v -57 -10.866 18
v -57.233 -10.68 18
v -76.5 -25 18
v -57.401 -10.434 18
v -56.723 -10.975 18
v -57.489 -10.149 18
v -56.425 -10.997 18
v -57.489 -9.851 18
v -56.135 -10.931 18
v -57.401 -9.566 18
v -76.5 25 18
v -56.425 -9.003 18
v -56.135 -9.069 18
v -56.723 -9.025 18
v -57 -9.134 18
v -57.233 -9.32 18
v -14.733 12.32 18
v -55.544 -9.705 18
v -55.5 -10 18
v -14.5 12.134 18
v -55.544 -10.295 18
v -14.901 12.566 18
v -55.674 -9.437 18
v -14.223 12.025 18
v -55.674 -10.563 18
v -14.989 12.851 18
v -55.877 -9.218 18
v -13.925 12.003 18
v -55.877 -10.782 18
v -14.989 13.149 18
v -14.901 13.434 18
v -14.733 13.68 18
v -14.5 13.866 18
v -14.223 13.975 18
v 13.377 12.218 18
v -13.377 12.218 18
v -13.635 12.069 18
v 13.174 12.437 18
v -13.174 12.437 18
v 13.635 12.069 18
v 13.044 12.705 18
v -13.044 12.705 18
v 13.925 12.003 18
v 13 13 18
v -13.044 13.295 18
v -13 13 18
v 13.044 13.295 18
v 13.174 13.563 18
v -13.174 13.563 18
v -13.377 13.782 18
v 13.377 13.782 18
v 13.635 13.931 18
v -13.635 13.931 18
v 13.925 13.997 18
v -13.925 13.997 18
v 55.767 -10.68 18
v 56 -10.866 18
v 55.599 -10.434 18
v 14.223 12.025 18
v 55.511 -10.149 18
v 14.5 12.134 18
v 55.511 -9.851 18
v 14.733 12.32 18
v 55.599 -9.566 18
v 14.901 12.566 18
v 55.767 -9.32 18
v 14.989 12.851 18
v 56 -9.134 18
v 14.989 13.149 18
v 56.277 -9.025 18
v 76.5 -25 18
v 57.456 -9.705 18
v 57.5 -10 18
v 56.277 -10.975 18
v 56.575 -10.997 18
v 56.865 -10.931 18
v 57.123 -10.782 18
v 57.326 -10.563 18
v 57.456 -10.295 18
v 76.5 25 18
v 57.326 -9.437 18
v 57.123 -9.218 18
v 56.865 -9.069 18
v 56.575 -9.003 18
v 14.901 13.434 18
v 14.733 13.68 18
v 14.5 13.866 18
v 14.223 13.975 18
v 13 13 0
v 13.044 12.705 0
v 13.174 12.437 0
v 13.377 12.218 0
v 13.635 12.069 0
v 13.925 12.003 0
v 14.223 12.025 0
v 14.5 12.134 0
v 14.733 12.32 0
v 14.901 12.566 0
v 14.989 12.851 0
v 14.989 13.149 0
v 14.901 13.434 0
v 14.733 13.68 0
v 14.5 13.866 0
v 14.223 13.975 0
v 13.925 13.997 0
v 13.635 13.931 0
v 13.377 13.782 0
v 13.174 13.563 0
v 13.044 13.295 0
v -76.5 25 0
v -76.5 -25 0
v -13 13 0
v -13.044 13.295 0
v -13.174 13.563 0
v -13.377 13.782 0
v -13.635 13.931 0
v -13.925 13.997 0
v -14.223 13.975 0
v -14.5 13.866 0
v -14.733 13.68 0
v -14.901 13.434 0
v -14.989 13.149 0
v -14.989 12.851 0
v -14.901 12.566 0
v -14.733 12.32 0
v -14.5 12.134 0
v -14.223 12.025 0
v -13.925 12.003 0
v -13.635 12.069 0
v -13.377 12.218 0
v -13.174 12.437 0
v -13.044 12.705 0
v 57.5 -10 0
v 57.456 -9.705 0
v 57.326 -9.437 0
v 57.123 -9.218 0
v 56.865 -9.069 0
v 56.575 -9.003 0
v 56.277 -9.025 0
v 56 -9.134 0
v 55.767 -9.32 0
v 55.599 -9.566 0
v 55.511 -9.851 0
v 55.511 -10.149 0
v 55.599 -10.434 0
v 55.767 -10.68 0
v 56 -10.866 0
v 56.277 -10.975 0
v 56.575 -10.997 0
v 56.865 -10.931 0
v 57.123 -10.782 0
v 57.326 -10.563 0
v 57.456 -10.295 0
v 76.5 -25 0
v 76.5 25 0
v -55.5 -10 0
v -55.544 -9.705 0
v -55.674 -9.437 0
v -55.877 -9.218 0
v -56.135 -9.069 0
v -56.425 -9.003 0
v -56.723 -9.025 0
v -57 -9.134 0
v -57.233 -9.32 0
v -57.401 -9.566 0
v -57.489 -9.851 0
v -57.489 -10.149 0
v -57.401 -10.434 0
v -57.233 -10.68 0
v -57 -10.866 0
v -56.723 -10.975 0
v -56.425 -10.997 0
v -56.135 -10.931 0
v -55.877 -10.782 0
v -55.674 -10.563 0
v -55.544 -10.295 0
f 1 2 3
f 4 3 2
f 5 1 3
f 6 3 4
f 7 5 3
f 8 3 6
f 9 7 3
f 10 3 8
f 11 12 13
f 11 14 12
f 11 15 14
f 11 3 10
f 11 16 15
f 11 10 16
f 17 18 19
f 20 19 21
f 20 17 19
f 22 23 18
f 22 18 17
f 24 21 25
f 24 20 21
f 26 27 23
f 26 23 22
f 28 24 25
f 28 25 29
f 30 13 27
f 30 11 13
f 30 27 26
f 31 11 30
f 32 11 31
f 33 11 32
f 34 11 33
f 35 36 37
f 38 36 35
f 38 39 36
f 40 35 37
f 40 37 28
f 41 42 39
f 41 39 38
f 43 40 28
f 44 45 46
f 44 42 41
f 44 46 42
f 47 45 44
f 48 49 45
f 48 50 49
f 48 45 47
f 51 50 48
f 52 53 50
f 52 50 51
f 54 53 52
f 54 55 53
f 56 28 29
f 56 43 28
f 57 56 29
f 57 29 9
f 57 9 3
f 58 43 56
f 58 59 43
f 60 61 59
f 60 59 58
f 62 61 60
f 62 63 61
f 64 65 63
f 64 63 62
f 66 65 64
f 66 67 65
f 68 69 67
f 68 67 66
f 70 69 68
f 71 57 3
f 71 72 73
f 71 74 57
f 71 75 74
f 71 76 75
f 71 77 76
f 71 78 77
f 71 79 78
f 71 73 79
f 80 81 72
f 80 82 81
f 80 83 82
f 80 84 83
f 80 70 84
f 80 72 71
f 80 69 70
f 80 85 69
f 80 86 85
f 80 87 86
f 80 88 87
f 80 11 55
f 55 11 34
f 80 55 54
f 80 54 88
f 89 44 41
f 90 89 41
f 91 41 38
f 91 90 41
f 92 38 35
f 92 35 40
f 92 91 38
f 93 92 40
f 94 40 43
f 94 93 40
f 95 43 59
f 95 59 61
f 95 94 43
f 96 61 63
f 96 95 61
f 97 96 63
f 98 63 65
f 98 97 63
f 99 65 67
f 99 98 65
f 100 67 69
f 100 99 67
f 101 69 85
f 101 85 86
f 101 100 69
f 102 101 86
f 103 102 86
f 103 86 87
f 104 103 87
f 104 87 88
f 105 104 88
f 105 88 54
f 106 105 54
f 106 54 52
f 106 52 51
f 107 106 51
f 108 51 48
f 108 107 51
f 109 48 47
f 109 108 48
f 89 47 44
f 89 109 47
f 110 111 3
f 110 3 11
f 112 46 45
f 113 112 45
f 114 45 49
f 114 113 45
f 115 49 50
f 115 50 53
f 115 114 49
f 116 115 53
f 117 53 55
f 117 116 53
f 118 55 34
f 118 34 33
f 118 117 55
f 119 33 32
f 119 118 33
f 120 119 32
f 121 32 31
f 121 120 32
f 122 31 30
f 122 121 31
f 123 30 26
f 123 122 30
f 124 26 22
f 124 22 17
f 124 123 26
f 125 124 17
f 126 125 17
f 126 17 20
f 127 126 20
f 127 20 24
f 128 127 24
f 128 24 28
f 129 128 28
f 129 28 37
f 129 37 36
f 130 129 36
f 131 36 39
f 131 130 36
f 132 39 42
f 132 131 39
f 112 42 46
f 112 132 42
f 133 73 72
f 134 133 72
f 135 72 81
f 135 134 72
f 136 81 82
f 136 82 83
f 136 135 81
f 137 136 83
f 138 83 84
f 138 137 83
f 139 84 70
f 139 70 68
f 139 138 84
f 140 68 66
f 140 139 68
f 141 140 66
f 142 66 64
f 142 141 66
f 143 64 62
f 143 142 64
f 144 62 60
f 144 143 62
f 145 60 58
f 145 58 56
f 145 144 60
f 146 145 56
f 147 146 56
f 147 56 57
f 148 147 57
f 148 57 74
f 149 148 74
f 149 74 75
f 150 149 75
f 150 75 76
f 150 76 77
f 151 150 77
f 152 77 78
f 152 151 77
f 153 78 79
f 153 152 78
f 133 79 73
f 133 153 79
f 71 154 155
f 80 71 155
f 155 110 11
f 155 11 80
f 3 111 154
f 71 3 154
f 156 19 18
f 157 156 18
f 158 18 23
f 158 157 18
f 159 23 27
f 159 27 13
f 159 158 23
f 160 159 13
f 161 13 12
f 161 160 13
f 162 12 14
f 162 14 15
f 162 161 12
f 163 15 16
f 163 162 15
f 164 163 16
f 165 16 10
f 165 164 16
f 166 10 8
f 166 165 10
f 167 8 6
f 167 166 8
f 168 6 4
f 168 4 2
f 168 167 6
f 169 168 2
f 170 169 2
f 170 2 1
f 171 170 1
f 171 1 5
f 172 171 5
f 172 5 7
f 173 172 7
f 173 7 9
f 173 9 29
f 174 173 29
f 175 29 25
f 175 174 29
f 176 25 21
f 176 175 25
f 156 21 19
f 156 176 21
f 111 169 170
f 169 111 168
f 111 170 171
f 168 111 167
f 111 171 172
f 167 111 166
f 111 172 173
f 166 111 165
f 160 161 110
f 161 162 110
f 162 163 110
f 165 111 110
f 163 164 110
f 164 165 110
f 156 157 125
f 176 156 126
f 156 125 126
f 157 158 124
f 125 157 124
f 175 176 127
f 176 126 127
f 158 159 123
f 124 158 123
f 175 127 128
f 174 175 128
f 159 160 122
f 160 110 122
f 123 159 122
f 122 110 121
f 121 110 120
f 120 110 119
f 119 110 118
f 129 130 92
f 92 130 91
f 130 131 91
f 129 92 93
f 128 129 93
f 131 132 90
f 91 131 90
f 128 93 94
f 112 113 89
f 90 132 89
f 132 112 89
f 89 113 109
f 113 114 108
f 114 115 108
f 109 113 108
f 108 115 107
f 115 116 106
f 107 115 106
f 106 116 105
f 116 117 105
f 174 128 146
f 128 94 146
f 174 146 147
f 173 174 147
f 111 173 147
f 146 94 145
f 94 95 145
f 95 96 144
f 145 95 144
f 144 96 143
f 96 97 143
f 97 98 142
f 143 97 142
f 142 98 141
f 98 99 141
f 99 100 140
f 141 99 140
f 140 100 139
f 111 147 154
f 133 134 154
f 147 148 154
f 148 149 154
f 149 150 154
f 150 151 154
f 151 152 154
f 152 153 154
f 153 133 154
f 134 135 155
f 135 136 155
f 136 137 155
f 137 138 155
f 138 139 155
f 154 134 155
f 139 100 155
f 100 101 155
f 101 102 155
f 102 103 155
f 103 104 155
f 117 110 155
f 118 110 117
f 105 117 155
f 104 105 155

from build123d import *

# Parameters (mm, degrees)
SKETCH1_W           = 153
SKETCH1_H           = 50
SKETCH1_R           = 1
BOSS_EXTRUDE1_DEPTH = 18


with BuildPart() as part:
    # Sketch1 → Boss-Extrude1 (new body)
    with BuildSketch(Plane.XY):
        Rectangle(SKETCH1_W, SKETCH1_H)
        with Locations((-14, 13)):
            Circle(SKETCH1_R, mode=Mode.SUBTRACT)
        with Locations(Location((14, 13, 0), (0, 0, 180))):
            Circle(SKETCH1_R, mode=Mode.SUBTRACT)
        with Locations((-56.5, -10)):
            Circle(SKETCH1_R, mode=Mode.SUBTRACT)
        with Locations((56.5, -10)):
            Circle(SKETCH1_R, mode=Mode.SUBTRACT)
    extrude(amount=BOSS_EXTRUDE1_DEPTH)


solid = part.part
